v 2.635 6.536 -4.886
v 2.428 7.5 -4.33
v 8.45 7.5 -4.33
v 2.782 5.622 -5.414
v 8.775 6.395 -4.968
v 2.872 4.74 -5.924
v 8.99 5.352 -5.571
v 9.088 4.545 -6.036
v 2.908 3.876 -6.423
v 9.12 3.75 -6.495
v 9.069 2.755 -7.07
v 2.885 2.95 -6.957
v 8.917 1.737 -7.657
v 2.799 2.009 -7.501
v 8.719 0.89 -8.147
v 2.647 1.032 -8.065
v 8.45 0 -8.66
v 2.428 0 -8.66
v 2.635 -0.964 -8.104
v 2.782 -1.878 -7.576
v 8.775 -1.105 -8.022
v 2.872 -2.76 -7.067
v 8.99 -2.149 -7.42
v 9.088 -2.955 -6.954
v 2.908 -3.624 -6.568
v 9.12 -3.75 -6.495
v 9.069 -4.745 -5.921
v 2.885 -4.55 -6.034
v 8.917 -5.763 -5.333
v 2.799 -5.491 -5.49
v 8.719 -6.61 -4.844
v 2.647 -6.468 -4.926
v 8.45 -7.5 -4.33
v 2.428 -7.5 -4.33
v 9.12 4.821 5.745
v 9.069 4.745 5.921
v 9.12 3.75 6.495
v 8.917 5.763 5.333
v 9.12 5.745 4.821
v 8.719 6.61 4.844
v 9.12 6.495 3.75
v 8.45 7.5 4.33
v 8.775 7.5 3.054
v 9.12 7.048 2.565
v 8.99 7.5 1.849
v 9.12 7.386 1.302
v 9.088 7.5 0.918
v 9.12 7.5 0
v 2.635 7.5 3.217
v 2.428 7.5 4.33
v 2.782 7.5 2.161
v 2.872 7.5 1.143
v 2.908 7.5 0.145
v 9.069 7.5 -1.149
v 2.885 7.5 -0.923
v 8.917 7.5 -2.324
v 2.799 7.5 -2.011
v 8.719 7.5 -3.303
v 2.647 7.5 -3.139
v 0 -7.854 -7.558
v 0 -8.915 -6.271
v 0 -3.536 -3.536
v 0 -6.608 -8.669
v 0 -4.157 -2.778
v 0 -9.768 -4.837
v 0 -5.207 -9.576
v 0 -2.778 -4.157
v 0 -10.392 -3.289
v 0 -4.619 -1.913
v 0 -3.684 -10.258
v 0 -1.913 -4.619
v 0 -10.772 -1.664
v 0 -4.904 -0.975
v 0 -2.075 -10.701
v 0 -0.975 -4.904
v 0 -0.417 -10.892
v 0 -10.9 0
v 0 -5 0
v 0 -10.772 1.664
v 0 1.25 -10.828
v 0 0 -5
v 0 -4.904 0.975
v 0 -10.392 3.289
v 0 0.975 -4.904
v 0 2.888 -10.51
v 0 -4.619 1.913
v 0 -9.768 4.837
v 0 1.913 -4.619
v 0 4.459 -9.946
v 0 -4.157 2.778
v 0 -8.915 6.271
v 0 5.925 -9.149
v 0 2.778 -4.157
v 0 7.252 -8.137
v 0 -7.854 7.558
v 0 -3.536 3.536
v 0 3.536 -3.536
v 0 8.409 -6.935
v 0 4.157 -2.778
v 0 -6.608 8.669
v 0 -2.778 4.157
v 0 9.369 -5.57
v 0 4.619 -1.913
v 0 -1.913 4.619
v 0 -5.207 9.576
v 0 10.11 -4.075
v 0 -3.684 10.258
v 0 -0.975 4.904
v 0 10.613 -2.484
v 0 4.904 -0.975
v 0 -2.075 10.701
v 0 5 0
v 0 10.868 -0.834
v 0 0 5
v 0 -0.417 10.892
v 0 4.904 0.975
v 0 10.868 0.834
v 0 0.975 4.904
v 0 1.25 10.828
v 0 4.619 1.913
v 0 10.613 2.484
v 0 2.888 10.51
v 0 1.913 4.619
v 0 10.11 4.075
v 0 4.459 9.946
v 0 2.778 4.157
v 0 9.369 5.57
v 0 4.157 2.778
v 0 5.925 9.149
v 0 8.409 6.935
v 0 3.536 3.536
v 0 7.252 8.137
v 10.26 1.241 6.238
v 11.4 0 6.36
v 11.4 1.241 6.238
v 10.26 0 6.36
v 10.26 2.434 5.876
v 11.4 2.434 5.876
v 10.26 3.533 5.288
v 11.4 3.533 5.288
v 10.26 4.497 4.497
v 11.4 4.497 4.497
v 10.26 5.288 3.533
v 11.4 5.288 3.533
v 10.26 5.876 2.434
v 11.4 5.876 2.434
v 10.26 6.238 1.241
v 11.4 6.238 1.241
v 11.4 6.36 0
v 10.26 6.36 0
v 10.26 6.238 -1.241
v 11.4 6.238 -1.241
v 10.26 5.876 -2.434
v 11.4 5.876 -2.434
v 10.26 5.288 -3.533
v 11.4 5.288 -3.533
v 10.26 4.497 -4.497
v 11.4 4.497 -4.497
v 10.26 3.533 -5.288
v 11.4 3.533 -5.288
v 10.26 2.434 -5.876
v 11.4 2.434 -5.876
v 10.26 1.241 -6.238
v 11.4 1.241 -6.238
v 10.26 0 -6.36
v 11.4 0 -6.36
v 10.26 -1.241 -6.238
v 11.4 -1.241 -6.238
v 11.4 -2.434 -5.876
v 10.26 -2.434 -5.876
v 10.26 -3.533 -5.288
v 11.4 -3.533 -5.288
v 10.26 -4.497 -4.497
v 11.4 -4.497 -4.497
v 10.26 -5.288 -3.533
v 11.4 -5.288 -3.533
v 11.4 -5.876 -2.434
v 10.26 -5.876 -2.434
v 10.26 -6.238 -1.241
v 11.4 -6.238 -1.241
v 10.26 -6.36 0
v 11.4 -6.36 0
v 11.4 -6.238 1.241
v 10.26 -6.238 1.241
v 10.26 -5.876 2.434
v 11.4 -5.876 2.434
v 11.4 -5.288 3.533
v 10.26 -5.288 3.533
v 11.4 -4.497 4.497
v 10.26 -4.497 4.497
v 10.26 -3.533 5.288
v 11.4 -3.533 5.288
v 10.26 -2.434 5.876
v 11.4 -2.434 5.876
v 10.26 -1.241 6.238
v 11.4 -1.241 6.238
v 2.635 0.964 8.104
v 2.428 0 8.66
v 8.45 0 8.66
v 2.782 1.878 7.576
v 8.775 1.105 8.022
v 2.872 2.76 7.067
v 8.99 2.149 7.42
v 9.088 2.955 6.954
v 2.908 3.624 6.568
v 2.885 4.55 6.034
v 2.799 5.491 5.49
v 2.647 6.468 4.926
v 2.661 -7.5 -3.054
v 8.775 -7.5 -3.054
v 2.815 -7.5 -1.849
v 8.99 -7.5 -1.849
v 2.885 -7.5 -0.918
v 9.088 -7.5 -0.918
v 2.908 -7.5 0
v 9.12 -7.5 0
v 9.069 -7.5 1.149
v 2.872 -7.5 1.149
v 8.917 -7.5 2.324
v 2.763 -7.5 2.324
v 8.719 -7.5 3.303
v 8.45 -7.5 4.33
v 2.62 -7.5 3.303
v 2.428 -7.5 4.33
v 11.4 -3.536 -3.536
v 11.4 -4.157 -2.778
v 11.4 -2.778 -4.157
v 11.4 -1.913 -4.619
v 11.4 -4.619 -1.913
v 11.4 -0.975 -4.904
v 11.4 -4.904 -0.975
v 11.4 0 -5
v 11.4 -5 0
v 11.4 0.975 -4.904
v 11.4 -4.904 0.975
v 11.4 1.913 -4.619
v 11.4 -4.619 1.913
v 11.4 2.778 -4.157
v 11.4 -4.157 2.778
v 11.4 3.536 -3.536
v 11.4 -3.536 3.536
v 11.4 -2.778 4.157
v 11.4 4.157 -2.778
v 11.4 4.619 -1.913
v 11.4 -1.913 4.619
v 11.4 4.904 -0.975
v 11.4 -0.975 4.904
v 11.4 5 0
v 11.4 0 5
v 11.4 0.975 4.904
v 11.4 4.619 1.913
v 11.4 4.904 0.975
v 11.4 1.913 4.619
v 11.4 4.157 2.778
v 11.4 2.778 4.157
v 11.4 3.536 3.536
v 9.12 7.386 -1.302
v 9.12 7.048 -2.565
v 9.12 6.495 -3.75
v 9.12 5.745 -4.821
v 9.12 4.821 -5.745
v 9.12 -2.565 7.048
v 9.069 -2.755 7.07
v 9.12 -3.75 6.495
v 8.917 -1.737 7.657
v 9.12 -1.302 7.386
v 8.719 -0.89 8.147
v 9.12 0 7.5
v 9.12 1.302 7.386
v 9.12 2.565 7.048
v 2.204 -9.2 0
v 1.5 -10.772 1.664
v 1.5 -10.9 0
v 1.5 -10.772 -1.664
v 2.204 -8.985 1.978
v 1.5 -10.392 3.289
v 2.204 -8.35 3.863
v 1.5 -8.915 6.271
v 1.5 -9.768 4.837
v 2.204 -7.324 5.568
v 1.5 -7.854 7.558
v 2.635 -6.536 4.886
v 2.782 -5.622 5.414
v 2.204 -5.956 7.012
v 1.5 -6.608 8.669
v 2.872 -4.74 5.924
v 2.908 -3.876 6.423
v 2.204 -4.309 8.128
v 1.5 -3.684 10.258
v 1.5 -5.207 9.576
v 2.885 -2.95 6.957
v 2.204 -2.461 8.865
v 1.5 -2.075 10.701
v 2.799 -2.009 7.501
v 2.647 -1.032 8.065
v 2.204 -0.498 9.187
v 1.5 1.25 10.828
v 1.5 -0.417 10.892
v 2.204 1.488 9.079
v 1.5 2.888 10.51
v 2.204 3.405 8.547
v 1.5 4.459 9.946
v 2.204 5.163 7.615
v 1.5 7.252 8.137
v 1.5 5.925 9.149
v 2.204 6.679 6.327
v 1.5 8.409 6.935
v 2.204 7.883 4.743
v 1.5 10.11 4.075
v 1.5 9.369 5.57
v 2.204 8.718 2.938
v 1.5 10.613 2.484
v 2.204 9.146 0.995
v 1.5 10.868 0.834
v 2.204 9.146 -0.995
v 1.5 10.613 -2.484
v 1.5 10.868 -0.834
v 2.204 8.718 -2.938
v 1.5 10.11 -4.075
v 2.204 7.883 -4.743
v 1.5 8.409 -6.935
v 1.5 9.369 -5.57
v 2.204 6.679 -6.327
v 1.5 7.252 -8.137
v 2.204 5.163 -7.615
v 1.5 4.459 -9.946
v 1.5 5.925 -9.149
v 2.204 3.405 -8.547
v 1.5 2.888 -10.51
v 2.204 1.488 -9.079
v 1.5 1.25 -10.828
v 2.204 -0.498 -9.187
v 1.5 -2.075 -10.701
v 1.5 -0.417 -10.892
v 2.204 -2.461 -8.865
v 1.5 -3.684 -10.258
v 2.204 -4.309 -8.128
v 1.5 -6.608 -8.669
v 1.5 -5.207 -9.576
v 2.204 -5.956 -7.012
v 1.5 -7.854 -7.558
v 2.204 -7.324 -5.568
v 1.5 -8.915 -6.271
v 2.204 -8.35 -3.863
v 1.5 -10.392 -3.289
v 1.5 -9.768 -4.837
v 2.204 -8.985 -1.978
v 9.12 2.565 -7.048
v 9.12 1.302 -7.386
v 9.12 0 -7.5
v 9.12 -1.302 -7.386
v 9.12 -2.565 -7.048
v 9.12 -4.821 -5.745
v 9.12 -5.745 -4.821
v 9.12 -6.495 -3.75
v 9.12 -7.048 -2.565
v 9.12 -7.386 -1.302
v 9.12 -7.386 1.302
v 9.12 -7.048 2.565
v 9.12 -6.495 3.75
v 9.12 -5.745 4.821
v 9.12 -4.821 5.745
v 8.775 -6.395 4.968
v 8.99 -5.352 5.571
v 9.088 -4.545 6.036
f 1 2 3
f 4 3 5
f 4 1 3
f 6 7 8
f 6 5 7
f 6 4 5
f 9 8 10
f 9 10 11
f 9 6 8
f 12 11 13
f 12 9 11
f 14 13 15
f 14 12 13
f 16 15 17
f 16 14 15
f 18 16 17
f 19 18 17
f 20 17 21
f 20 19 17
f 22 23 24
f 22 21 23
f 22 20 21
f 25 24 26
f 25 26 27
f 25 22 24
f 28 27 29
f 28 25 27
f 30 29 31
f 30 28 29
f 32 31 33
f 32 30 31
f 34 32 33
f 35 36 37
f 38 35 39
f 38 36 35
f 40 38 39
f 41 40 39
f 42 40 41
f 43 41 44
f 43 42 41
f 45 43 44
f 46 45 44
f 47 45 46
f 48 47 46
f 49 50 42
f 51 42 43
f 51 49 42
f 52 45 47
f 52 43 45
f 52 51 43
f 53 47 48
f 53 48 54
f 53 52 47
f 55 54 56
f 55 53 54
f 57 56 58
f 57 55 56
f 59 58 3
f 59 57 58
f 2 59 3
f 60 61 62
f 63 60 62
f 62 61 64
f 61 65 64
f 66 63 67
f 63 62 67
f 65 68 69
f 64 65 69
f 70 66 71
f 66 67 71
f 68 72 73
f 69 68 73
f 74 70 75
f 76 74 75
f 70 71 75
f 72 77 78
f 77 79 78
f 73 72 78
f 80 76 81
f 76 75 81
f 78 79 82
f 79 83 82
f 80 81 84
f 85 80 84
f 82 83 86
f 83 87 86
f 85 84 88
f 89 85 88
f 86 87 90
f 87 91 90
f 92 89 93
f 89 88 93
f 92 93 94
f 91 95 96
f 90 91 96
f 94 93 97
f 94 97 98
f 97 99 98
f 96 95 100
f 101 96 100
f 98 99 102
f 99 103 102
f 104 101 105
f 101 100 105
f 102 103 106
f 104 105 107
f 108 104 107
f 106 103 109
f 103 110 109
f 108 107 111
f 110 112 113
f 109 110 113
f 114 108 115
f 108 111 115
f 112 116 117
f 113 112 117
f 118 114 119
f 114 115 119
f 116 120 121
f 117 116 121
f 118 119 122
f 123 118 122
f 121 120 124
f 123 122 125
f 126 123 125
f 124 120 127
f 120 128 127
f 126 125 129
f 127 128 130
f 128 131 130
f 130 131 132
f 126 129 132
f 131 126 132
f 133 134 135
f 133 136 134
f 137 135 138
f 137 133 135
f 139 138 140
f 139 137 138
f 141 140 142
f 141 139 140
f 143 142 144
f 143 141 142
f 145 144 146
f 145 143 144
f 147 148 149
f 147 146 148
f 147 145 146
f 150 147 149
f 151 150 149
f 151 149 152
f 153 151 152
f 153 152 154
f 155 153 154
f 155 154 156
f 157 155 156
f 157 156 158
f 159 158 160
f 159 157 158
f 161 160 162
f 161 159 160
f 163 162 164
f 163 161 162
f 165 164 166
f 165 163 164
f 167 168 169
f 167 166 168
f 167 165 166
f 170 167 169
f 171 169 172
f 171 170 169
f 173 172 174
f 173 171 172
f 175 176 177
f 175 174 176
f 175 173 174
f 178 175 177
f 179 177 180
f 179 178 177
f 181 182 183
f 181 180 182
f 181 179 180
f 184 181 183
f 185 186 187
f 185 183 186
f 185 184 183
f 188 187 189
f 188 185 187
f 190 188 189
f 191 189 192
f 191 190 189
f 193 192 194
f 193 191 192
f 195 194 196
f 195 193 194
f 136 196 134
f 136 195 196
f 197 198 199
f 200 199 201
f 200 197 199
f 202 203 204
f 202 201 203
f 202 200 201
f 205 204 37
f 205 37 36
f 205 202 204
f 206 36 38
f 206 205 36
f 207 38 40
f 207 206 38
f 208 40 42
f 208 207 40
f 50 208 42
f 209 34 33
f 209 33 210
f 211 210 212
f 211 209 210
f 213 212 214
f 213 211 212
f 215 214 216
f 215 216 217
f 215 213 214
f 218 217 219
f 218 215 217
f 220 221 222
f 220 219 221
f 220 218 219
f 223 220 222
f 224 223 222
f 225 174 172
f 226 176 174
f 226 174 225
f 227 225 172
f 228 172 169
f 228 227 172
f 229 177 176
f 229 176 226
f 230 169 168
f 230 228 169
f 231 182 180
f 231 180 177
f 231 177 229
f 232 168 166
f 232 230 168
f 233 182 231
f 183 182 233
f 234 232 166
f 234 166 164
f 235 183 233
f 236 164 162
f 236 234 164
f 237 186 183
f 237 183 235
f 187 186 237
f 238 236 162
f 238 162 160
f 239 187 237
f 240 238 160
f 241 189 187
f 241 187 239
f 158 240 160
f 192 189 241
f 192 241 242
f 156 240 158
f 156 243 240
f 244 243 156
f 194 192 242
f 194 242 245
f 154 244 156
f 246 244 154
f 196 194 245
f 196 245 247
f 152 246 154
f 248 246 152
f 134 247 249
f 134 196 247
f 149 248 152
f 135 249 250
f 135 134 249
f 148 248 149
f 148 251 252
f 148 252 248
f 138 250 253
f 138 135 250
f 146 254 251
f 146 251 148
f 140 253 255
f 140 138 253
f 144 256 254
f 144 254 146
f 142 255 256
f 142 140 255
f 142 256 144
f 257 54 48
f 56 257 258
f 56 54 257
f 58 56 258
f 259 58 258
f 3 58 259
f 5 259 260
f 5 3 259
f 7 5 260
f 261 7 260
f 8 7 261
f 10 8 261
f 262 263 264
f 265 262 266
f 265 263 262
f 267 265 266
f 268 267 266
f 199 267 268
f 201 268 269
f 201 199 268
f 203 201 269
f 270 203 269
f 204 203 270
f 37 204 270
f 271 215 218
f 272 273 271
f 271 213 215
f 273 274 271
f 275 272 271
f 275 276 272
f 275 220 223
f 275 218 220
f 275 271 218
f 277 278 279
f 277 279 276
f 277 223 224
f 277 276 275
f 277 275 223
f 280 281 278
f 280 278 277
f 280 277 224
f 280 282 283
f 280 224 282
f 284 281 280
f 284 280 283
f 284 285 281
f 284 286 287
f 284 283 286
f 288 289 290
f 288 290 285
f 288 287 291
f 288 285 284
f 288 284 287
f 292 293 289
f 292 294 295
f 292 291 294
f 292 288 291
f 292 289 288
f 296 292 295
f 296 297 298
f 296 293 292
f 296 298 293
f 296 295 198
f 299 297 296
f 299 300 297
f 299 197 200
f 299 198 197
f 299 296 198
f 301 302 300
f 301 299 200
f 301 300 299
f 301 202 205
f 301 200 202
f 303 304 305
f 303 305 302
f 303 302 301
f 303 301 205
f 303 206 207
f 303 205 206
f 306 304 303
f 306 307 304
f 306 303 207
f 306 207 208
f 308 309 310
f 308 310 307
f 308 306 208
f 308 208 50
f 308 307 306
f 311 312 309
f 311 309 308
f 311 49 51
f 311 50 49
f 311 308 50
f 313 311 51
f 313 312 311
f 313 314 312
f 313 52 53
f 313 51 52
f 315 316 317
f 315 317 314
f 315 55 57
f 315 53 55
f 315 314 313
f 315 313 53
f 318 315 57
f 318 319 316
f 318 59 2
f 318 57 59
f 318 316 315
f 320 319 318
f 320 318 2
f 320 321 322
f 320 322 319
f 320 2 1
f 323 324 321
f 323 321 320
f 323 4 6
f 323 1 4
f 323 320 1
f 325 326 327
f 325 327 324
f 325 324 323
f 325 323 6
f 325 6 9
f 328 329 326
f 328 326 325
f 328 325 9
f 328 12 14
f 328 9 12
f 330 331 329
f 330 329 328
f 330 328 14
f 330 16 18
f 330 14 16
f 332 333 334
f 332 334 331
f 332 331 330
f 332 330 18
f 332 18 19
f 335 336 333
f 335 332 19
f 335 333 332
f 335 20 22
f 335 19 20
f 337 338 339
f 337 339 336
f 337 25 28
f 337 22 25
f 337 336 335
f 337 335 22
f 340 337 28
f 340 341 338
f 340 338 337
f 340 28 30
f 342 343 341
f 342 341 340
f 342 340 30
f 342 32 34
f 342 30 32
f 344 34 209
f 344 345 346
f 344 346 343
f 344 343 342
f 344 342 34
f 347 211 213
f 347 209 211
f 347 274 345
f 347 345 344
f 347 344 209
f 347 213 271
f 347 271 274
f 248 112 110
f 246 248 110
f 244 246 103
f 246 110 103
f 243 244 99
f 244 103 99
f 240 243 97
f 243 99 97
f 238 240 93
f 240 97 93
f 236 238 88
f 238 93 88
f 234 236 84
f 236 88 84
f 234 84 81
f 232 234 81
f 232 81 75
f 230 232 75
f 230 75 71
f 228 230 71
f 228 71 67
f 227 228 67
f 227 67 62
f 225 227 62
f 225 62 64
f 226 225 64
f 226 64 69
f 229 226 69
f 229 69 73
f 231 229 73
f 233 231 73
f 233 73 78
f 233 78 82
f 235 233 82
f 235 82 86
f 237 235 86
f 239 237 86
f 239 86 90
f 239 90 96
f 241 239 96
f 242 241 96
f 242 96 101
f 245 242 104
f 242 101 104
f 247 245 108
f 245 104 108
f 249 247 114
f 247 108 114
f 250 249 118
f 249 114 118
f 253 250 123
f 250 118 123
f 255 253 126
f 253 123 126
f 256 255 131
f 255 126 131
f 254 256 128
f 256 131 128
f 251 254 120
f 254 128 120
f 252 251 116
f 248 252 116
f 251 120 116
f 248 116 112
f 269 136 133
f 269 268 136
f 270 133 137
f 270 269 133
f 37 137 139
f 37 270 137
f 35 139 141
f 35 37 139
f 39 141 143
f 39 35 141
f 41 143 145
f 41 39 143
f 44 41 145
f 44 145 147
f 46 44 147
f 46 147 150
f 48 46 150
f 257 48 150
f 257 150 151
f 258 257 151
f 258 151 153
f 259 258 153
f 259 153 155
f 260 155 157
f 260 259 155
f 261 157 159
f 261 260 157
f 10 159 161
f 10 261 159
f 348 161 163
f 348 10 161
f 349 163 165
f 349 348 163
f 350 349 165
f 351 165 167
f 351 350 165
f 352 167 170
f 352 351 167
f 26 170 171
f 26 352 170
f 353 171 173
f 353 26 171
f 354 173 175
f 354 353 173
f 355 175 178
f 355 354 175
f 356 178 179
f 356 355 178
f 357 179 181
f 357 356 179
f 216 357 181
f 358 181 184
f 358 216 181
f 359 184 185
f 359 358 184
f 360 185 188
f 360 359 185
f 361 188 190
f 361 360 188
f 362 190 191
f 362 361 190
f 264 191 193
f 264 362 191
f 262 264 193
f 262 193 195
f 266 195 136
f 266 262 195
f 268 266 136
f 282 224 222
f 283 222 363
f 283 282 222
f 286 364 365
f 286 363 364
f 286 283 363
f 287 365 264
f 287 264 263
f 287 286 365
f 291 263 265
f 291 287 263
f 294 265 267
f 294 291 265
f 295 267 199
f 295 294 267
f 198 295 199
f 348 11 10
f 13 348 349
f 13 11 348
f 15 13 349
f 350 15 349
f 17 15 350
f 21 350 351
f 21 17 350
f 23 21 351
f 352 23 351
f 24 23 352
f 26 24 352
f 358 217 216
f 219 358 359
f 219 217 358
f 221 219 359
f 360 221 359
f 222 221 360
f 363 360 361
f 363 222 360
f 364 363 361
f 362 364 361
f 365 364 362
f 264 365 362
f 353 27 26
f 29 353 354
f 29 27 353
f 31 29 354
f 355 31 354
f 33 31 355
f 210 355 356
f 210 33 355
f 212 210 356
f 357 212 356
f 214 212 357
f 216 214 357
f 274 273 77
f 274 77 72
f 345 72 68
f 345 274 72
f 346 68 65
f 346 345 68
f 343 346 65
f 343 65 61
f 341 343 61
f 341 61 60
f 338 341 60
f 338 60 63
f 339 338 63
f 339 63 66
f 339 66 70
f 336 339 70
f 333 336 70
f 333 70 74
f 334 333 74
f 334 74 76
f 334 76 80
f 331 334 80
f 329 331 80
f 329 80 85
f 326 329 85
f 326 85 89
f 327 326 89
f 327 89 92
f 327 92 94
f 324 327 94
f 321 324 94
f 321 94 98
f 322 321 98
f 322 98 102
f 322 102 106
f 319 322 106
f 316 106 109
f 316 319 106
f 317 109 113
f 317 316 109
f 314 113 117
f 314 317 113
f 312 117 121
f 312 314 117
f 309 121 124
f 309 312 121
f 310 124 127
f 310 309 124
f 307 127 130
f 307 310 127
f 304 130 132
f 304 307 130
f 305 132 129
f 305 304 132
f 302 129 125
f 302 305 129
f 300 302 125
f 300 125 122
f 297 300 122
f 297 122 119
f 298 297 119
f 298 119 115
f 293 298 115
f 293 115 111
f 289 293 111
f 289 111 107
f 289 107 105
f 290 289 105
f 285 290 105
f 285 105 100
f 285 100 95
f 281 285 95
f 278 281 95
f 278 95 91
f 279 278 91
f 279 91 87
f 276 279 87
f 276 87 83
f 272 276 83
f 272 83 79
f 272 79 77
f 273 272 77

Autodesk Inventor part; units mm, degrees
ref_plane "YZ Plane" through (0, 0, 0) normal (1, 0, 0) x (0, 1, 0)
ref_plane "XZ Plane" through (0, 0, 0) normal (0, 1, 0) x (-1, 0, 0)
ref_plane "XY Plane" through (0, 0, 0) normal (0, 0, 1) x (1, 0, 0)
sketch "Sketch2" plane through (0, 0, 0) normal (1, 0, 0) x (0, 1, 0)
  line L0 (-7.5, 4.3301) -> (0, 8.6603)
  line L1 (0, 8.6603) -> (7.5, 4.3301)
  line L2 (7.5, 4.3301) -> (7.5, -4.3301)
  line L3 (7.5, -4.3301) -> (0, -8.6603)
  line L4 (0, -8.6603) -> (-7.5, -4.3301)
  line L5 (-7.5, -4.3301) -> (-7.5, 4.3301)
  line L6 (0, 12.1244) -> (0, -12.1244) projected
  circle A0 centre (0, 0) radius 5
  dimension "d1" = 10
extrude "Extrusion1" add sketch "Sketch2" along normal blind 11.4 contours L0 L6 A0 L4 L5 | L1 L2 L3 L6 A0
sketch "Sketch3" plane through (0, 0, 0) normal (0, 0, 1) x (1, 0, 0)
  line L0 (0, 10.9) -> (0, -10.9) projected
  line L1 (0, -10.9) -> (0, -5)
  line L2 (0, -10.9) -> (1.5, -10.9)
  line L3 (1.5, -10.9) -> (3.9439, -5)
  line L4 (3.9439, -5) -> (0, -5)
  line L5 (-0.7888, 0) -> (4.7326, 0) projected
  point P0 (0, 0)
  dimension "d4" = 1.5
  dimension "d5" = 22.5
  dimension "d6" = 5
revolve "Revolution1" add sketch "Sketch3" angle 360 about axis through (0, 0, 0) along (1, 0, 0)
sketch "Sketch4" plane through (0, 0, 0) normal (0, 1, 0) x (-1, 0, 0)
  line L0 (-11.4, 4.3301) -> (-11.4, 8.6603) projected
  line L1 (-11.4, 6.36) -> (-10.26, 6.36)
  line L2 (-10.26, 6.36) -> (-9.12, 7.5)
  line L3 (-9.12, 7.5) -> (-8.0461, 9.36)
  line L4 (-8.0461, 9.36) -> (-11.4, 9.36)
  line L5 (-11.4, 9.36) -> (-11.4, 6.36)
  line L6 (-9.12, 7.5) -> (-10.26, 6.36)
  line L7 (-8.4501, 8.6603) -> (-9.12, 7.5)
  line L8 (2.28, 0) -> (-13.68, 0) projected
  point P0 (0, 0)
  dimension "d8" = 135
  dimension "d9" = 1.14
  dimension "d10" = 6.36
  dimension "d11" = 120
  dimension "d12" = 2.28
  dimension "d13" = 3
revolve "Revolution2" cut sketch "Sketch4" angle 360 about axis through (-10, 0, 0) along (1, 0, 0)
thread "Thread1" size "M10x1.5" class "6H" standard "ANSI Metric M Profile" full length
properties part number "314-11" material "Steel, Mild"
